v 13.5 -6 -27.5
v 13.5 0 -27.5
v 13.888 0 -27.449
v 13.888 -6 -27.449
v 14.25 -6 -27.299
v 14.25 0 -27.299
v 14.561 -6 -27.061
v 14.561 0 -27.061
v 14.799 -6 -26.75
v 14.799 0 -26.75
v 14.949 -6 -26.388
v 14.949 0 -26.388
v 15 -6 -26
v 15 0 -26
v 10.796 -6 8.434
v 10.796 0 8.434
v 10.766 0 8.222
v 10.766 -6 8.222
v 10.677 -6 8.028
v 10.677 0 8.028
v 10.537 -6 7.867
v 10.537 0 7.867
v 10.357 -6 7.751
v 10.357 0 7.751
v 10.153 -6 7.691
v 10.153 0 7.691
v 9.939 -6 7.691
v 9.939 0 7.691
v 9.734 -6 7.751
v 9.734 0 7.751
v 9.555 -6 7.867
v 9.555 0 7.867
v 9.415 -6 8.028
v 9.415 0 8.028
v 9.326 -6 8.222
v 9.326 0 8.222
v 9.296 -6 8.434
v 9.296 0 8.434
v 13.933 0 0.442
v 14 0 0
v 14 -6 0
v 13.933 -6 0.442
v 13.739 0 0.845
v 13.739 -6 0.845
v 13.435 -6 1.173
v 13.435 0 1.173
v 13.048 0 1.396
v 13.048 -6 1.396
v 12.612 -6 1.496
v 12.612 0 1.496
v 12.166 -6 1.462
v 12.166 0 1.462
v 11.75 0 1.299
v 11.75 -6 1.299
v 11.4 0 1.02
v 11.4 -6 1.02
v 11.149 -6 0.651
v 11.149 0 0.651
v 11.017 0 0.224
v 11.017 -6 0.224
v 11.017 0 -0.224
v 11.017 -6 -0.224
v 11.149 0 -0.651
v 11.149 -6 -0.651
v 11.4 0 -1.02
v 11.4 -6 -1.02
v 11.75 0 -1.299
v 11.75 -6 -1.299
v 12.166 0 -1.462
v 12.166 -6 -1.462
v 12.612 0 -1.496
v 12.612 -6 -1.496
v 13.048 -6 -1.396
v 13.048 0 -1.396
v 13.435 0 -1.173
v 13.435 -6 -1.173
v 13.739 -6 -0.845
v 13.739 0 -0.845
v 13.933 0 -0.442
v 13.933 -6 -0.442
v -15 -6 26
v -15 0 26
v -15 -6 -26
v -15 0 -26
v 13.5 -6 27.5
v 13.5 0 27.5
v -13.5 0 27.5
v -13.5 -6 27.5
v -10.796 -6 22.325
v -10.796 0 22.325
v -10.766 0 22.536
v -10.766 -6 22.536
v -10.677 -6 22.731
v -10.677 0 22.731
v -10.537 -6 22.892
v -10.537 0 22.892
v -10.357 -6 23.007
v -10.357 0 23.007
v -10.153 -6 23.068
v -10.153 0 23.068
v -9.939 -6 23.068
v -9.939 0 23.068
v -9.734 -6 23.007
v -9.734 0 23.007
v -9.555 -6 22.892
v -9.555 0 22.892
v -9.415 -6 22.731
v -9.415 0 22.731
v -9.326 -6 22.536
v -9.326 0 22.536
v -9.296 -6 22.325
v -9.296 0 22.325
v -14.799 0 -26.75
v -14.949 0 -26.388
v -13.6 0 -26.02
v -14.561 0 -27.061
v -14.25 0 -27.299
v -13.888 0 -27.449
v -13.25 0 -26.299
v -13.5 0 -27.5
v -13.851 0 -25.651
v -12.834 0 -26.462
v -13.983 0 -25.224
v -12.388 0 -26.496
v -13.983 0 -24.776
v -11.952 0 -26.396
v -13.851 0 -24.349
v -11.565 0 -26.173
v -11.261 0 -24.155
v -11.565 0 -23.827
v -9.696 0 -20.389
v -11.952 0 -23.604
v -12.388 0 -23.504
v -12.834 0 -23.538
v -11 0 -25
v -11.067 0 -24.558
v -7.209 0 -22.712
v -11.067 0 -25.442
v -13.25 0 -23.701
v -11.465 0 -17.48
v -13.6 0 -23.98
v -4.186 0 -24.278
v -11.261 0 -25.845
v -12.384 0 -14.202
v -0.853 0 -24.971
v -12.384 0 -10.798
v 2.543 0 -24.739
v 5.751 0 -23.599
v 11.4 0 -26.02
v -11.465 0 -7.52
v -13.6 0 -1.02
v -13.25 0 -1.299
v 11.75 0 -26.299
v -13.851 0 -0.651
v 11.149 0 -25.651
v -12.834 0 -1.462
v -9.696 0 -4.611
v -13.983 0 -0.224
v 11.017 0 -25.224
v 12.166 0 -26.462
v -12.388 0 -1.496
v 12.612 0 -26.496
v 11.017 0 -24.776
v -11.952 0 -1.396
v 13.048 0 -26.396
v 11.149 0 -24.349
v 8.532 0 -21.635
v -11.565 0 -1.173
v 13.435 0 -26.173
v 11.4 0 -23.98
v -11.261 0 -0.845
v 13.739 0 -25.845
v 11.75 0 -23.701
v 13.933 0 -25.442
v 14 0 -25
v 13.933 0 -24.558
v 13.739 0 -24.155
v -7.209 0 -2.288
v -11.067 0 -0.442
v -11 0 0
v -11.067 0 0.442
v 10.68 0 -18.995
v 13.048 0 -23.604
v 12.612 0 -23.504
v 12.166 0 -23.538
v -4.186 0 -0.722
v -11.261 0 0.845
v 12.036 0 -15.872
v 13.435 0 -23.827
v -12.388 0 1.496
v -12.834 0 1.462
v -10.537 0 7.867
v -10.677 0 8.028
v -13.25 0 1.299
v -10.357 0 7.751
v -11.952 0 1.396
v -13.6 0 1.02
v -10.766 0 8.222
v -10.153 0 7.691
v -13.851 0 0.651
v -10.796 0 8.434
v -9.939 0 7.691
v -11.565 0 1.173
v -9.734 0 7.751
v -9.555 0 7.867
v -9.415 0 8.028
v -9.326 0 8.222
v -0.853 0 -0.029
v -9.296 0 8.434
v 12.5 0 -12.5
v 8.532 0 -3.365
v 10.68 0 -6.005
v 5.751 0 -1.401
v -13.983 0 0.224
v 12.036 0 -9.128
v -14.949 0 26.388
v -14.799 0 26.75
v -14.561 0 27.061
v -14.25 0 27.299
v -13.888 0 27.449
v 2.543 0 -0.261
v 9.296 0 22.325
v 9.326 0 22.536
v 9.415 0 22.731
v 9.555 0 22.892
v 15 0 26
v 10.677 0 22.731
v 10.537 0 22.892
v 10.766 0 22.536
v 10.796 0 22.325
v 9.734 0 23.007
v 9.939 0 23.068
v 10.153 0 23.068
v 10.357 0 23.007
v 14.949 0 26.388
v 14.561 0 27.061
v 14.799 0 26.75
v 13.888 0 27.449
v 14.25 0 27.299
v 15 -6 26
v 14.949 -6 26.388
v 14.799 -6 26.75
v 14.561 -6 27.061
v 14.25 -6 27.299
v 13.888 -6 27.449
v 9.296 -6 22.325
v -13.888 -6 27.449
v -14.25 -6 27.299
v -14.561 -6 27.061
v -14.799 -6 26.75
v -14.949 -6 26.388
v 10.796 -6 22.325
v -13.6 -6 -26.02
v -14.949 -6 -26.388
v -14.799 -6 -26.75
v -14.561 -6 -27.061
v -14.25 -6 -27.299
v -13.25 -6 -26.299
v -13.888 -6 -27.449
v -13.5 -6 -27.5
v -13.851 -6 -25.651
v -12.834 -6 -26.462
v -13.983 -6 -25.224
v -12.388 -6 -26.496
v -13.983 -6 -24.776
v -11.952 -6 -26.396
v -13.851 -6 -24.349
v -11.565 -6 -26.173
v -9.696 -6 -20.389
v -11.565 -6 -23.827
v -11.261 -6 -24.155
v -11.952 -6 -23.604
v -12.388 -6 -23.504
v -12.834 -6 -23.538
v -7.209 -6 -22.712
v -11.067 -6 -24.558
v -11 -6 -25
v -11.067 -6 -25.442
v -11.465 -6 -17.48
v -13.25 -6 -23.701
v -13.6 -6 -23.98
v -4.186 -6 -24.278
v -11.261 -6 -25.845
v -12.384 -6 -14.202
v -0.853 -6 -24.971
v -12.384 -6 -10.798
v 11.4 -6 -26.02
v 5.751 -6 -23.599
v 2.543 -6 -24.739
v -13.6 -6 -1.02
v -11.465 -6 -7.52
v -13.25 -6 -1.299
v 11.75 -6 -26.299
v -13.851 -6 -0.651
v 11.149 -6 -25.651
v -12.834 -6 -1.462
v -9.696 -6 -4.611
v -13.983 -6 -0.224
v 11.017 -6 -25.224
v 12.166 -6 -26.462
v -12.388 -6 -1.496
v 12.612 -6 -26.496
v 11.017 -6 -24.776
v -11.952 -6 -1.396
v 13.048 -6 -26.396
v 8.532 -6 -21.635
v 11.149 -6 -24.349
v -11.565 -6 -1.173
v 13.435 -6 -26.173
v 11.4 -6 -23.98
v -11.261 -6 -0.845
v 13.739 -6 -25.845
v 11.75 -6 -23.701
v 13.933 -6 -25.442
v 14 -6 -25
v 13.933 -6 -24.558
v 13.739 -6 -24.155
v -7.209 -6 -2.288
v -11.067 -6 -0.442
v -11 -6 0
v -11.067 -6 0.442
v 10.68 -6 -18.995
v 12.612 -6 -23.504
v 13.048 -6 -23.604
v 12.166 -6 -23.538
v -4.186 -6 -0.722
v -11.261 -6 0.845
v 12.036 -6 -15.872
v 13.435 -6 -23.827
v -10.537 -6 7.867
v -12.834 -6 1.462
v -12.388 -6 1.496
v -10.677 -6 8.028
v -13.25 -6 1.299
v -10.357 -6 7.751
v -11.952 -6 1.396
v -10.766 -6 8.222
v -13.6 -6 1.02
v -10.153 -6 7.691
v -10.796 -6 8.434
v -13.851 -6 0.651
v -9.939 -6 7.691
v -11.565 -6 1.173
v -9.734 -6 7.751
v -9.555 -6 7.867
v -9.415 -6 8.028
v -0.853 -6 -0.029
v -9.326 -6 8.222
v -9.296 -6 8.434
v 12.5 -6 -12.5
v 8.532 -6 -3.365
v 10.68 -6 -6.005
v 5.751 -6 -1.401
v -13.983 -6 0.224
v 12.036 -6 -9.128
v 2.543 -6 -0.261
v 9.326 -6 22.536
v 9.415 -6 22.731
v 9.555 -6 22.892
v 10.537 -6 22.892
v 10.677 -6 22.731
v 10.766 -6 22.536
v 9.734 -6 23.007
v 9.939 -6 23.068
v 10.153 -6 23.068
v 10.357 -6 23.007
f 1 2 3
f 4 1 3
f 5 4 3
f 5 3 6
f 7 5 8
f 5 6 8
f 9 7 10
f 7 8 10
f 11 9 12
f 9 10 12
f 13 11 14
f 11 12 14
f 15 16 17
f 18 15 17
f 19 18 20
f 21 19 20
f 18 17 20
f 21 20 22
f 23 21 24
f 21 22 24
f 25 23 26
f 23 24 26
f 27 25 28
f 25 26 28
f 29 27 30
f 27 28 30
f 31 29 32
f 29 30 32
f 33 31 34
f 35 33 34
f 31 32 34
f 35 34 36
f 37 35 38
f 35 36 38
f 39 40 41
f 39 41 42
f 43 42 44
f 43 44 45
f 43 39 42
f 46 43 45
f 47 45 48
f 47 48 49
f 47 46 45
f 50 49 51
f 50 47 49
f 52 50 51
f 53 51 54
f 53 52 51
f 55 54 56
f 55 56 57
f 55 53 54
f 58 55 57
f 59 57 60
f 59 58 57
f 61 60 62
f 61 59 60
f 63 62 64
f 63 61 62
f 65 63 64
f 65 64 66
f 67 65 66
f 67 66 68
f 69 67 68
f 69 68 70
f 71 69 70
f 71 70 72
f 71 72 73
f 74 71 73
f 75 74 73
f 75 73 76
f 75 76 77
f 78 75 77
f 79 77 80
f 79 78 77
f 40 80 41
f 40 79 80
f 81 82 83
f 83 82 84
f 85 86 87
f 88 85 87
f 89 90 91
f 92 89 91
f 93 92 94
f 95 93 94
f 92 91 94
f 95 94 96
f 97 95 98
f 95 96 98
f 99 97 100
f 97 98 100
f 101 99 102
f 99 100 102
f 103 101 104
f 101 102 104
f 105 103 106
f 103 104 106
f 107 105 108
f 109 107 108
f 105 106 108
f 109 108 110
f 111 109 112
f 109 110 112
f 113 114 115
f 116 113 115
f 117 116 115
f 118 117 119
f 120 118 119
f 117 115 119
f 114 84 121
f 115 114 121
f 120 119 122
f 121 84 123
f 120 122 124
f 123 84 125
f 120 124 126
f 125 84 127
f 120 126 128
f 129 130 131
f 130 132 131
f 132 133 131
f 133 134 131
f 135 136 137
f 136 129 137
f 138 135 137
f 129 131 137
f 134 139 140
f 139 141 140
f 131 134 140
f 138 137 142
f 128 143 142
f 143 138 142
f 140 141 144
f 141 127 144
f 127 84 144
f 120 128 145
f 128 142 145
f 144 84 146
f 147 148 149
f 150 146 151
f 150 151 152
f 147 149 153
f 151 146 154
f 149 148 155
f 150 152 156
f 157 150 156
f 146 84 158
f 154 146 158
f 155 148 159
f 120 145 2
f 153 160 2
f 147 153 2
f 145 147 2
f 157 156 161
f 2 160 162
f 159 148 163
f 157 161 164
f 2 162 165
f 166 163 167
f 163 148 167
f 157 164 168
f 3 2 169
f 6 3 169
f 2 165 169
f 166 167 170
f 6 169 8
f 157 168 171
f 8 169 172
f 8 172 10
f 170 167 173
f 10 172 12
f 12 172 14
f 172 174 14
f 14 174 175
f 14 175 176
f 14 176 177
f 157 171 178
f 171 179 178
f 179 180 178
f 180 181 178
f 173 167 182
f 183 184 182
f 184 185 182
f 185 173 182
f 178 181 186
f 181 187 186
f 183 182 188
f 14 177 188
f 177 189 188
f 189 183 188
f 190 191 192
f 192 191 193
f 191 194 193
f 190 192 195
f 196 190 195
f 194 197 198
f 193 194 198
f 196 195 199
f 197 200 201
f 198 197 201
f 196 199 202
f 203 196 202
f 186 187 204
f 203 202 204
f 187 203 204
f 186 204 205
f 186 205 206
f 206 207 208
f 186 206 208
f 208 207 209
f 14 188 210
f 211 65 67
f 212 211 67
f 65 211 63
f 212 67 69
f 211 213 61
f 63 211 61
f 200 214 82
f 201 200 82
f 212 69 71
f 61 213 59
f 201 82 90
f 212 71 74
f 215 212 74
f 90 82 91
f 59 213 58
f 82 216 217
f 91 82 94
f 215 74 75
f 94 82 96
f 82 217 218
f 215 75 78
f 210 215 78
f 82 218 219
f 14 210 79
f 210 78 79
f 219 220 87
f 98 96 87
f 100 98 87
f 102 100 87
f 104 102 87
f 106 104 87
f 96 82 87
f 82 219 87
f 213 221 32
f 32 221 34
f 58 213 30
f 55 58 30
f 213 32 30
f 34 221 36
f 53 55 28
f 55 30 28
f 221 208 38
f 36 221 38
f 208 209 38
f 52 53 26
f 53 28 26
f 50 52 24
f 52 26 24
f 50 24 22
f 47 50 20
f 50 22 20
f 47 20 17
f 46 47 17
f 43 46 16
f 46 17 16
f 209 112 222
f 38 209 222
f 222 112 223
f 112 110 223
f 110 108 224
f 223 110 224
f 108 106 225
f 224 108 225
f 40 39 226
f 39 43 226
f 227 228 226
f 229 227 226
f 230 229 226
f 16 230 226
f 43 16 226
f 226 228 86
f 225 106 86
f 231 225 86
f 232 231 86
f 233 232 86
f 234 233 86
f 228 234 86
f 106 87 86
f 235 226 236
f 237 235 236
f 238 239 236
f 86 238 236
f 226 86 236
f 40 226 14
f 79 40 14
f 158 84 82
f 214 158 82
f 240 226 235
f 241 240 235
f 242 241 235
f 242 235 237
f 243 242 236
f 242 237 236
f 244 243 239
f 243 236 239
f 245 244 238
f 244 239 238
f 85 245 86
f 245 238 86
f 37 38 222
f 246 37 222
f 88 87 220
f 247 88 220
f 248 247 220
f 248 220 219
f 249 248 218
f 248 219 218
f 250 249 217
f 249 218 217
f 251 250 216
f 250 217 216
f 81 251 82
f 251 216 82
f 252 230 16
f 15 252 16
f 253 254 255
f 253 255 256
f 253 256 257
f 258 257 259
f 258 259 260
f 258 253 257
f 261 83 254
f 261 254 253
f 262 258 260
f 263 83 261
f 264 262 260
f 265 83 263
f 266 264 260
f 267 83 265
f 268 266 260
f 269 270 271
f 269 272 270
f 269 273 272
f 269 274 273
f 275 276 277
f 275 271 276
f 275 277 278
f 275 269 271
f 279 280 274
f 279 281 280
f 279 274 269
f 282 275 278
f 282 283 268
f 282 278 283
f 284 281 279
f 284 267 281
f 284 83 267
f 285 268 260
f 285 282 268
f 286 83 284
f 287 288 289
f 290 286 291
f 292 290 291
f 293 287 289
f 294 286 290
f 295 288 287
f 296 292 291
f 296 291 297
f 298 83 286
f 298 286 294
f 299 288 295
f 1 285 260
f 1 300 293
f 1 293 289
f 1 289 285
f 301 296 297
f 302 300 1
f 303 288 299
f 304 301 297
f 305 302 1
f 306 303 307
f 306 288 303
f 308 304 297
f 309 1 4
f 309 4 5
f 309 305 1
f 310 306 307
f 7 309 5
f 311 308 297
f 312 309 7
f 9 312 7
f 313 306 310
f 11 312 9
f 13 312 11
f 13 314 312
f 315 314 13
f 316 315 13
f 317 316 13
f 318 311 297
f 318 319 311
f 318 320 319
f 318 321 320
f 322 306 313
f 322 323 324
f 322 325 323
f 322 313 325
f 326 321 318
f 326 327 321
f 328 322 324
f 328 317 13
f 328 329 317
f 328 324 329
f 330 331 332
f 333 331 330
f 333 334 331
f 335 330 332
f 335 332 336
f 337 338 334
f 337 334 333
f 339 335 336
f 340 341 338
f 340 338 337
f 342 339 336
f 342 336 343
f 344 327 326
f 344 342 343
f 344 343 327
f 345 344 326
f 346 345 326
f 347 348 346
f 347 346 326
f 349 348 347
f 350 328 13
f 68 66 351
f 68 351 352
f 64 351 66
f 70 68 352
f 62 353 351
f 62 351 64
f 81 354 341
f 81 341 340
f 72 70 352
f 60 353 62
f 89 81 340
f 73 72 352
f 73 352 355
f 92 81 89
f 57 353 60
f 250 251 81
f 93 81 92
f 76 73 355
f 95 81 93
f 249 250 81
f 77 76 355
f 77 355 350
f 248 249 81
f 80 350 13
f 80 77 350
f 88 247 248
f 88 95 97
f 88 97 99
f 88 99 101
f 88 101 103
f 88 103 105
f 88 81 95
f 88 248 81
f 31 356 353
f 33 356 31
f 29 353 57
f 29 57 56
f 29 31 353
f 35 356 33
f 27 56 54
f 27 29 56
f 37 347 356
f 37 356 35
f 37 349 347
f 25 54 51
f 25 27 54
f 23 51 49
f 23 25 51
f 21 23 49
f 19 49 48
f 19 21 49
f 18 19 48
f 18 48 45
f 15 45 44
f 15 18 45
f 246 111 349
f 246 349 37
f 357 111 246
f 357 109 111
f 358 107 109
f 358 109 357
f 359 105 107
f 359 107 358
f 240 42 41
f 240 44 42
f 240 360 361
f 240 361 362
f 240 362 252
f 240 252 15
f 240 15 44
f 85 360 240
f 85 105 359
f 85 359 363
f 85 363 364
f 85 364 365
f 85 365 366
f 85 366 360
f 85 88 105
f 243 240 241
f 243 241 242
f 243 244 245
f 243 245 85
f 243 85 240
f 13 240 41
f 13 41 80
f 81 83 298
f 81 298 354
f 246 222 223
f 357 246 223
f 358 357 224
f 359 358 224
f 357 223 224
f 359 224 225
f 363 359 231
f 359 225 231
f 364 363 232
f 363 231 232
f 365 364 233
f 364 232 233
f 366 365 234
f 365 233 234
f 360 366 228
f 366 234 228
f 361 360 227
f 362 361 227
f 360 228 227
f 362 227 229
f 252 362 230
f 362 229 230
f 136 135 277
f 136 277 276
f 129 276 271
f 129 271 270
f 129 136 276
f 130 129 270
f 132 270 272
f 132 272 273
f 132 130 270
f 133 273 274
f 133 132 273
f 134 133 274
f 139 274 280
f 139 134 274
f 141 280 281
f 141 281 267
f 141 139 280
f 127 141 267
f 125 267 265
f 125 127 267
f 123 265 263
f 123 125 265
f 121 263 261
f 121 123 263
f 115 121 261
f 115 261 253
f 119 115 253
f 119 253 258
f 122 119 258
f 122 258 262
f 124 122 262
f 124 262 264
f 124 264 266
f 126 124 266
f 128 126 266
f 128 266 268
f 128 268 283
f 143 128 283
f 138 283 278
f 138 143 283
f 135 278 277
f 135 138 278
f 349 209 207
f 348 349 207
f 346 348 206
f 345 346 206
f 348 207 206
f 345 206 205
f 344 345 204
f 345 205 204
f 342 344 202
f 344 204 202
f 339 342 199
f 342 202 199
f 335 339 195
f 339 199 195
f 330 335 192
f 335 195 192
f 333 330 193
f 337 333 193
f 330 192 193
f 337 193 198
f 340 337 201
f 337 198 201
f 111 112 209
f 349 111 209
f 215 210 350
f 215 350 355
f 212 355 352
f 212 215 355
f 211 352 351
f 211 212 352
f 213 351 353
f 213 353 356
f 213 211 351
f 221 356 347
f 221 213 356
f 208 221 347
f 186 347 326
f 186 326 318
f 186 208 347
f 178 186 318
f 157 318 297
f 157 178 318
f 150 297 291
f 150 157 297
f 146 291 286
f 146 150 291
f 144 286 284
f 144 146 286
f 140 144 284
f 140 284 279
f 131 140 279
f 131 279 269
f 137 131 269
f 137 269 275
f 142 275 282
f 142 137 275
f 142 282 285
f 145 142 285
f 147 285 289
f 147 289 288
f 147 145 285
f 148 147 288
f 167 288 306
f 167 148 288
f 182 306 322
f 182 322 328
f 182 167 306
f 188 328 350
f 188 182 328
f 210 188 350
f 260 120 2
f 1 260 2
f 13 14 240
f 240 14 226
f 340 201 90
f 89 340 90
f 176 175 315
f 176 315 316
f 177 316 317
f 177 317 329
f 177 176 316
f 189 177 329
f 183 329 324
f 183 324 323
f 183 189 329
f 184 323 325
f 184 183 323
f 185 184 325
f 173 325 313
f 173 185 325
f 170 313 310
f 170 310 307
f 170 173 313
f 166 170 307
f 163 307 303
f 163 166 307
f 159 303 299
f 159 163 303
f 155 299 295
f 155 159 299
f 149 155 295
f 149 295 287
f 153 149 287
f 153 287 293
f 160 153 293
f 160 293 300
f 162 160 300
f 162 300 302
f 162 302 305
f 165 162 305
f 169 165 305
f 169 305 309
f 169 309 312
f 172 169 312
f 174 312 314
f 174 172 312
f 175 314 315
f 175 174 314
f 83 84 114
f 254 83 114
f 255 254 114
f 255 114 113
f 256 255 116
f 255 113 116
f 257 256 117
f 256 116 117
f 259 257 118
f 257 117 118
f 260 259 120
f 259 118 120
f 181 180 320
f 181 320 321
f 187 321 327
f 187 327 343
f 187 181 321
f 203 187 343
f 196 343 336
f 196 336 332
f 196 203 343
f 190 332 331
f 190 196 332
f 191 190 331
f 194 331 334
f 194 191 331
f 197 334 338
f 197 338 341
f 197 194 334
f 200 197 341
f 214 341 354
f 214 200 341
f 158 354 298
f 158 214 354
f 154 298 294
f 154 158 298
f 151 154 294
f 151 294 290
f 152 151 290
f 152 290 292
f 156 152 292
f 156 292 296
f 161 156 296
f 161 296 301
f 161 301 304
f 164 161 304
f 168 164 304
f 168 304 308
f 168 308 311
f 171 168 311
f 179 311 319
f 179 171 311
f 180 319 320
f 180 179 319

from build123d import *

# Parameters (mm, degrees)
F0_R     = 1.5
F0_R_2   = 12.5
F1_DEPTH = 6


with BuildPart() as f1:
    # F0 (on Front) → F1 (new body)
    with BuildSketch(Plane.XZ):
        with BuildLine():
            Line((-13.5, -27.5), (13.5, -27.5))
            ThreePointArc((13.5, -27.5), (14.56066, -27.06066), (15, -26))
            Line((15, -26), (15, 26))
            ThreePointArc((15, 26), (14.56066, 27.06066), (13.5, 27.5))
            Line((13.5, 27.5), (-13.5, 27.5))
            ThreePointArc((-13.5, 27.5), (-14.56066, 27.06066), (-15, 26))
            Line((-15, 26), (-15, -26))
            ThreePointArc((-15, -26), (-14.56066, -27.06066), (-13.5, -27.5))
        make_face()
        with Locations((-12.5, -25)):
            Circle(F0_R, mode=Mode.SUBTRACT)
        with Locations((12.5, -25)):
            Circle(F0_R, mode=Mode.SUBTRACT)
        with Locations((0, -12.5)):
            Circle(F0_R_2, mode=Mode.SUBTRACT)
        with Locations((-12.5, 0)):
            Circle(F0_R, mode=Mode.SUBTRACT)
        with BuildLine():
            Line((-9.295934, 22.325195), (-9.295934, 8.433623))
            ThreePointArc((-9.295934, 8.433623), (-10.045934, 7.683623), (-10.795934, 8.433623))
            Line((-10.795934, 8.433623), (-10.795934, 22.325195))
            ThreePointArc((-10.795934, 22.325195), (-10.045934, 23.075195), (-9.295934, 22.325195))
        make_face(mode=Mode.SUBTRACT)
        with Locations((12.5, 0)):
            Circle(F0_R, mode=Mode.SUBTRACT)
        with BuildLine():
            Line((10.795934, 22.325195), (10.795934, 8.433623))
            ThreePointArc((10.795934, 8.433623), (10.045934, 7.683623), (9.295934, 8.433623))
            Line((9.295934, 8.433623), (9.295934, 22.325195))
            ThreePointArc((9.295934, 22.325195), (10.045934, 23.075195), (10.795934, 22.325195))
        make_face(mode=Mode.SUBTRACT)
    extrude(amount=F1_DEPTH)


solid = f1.part
